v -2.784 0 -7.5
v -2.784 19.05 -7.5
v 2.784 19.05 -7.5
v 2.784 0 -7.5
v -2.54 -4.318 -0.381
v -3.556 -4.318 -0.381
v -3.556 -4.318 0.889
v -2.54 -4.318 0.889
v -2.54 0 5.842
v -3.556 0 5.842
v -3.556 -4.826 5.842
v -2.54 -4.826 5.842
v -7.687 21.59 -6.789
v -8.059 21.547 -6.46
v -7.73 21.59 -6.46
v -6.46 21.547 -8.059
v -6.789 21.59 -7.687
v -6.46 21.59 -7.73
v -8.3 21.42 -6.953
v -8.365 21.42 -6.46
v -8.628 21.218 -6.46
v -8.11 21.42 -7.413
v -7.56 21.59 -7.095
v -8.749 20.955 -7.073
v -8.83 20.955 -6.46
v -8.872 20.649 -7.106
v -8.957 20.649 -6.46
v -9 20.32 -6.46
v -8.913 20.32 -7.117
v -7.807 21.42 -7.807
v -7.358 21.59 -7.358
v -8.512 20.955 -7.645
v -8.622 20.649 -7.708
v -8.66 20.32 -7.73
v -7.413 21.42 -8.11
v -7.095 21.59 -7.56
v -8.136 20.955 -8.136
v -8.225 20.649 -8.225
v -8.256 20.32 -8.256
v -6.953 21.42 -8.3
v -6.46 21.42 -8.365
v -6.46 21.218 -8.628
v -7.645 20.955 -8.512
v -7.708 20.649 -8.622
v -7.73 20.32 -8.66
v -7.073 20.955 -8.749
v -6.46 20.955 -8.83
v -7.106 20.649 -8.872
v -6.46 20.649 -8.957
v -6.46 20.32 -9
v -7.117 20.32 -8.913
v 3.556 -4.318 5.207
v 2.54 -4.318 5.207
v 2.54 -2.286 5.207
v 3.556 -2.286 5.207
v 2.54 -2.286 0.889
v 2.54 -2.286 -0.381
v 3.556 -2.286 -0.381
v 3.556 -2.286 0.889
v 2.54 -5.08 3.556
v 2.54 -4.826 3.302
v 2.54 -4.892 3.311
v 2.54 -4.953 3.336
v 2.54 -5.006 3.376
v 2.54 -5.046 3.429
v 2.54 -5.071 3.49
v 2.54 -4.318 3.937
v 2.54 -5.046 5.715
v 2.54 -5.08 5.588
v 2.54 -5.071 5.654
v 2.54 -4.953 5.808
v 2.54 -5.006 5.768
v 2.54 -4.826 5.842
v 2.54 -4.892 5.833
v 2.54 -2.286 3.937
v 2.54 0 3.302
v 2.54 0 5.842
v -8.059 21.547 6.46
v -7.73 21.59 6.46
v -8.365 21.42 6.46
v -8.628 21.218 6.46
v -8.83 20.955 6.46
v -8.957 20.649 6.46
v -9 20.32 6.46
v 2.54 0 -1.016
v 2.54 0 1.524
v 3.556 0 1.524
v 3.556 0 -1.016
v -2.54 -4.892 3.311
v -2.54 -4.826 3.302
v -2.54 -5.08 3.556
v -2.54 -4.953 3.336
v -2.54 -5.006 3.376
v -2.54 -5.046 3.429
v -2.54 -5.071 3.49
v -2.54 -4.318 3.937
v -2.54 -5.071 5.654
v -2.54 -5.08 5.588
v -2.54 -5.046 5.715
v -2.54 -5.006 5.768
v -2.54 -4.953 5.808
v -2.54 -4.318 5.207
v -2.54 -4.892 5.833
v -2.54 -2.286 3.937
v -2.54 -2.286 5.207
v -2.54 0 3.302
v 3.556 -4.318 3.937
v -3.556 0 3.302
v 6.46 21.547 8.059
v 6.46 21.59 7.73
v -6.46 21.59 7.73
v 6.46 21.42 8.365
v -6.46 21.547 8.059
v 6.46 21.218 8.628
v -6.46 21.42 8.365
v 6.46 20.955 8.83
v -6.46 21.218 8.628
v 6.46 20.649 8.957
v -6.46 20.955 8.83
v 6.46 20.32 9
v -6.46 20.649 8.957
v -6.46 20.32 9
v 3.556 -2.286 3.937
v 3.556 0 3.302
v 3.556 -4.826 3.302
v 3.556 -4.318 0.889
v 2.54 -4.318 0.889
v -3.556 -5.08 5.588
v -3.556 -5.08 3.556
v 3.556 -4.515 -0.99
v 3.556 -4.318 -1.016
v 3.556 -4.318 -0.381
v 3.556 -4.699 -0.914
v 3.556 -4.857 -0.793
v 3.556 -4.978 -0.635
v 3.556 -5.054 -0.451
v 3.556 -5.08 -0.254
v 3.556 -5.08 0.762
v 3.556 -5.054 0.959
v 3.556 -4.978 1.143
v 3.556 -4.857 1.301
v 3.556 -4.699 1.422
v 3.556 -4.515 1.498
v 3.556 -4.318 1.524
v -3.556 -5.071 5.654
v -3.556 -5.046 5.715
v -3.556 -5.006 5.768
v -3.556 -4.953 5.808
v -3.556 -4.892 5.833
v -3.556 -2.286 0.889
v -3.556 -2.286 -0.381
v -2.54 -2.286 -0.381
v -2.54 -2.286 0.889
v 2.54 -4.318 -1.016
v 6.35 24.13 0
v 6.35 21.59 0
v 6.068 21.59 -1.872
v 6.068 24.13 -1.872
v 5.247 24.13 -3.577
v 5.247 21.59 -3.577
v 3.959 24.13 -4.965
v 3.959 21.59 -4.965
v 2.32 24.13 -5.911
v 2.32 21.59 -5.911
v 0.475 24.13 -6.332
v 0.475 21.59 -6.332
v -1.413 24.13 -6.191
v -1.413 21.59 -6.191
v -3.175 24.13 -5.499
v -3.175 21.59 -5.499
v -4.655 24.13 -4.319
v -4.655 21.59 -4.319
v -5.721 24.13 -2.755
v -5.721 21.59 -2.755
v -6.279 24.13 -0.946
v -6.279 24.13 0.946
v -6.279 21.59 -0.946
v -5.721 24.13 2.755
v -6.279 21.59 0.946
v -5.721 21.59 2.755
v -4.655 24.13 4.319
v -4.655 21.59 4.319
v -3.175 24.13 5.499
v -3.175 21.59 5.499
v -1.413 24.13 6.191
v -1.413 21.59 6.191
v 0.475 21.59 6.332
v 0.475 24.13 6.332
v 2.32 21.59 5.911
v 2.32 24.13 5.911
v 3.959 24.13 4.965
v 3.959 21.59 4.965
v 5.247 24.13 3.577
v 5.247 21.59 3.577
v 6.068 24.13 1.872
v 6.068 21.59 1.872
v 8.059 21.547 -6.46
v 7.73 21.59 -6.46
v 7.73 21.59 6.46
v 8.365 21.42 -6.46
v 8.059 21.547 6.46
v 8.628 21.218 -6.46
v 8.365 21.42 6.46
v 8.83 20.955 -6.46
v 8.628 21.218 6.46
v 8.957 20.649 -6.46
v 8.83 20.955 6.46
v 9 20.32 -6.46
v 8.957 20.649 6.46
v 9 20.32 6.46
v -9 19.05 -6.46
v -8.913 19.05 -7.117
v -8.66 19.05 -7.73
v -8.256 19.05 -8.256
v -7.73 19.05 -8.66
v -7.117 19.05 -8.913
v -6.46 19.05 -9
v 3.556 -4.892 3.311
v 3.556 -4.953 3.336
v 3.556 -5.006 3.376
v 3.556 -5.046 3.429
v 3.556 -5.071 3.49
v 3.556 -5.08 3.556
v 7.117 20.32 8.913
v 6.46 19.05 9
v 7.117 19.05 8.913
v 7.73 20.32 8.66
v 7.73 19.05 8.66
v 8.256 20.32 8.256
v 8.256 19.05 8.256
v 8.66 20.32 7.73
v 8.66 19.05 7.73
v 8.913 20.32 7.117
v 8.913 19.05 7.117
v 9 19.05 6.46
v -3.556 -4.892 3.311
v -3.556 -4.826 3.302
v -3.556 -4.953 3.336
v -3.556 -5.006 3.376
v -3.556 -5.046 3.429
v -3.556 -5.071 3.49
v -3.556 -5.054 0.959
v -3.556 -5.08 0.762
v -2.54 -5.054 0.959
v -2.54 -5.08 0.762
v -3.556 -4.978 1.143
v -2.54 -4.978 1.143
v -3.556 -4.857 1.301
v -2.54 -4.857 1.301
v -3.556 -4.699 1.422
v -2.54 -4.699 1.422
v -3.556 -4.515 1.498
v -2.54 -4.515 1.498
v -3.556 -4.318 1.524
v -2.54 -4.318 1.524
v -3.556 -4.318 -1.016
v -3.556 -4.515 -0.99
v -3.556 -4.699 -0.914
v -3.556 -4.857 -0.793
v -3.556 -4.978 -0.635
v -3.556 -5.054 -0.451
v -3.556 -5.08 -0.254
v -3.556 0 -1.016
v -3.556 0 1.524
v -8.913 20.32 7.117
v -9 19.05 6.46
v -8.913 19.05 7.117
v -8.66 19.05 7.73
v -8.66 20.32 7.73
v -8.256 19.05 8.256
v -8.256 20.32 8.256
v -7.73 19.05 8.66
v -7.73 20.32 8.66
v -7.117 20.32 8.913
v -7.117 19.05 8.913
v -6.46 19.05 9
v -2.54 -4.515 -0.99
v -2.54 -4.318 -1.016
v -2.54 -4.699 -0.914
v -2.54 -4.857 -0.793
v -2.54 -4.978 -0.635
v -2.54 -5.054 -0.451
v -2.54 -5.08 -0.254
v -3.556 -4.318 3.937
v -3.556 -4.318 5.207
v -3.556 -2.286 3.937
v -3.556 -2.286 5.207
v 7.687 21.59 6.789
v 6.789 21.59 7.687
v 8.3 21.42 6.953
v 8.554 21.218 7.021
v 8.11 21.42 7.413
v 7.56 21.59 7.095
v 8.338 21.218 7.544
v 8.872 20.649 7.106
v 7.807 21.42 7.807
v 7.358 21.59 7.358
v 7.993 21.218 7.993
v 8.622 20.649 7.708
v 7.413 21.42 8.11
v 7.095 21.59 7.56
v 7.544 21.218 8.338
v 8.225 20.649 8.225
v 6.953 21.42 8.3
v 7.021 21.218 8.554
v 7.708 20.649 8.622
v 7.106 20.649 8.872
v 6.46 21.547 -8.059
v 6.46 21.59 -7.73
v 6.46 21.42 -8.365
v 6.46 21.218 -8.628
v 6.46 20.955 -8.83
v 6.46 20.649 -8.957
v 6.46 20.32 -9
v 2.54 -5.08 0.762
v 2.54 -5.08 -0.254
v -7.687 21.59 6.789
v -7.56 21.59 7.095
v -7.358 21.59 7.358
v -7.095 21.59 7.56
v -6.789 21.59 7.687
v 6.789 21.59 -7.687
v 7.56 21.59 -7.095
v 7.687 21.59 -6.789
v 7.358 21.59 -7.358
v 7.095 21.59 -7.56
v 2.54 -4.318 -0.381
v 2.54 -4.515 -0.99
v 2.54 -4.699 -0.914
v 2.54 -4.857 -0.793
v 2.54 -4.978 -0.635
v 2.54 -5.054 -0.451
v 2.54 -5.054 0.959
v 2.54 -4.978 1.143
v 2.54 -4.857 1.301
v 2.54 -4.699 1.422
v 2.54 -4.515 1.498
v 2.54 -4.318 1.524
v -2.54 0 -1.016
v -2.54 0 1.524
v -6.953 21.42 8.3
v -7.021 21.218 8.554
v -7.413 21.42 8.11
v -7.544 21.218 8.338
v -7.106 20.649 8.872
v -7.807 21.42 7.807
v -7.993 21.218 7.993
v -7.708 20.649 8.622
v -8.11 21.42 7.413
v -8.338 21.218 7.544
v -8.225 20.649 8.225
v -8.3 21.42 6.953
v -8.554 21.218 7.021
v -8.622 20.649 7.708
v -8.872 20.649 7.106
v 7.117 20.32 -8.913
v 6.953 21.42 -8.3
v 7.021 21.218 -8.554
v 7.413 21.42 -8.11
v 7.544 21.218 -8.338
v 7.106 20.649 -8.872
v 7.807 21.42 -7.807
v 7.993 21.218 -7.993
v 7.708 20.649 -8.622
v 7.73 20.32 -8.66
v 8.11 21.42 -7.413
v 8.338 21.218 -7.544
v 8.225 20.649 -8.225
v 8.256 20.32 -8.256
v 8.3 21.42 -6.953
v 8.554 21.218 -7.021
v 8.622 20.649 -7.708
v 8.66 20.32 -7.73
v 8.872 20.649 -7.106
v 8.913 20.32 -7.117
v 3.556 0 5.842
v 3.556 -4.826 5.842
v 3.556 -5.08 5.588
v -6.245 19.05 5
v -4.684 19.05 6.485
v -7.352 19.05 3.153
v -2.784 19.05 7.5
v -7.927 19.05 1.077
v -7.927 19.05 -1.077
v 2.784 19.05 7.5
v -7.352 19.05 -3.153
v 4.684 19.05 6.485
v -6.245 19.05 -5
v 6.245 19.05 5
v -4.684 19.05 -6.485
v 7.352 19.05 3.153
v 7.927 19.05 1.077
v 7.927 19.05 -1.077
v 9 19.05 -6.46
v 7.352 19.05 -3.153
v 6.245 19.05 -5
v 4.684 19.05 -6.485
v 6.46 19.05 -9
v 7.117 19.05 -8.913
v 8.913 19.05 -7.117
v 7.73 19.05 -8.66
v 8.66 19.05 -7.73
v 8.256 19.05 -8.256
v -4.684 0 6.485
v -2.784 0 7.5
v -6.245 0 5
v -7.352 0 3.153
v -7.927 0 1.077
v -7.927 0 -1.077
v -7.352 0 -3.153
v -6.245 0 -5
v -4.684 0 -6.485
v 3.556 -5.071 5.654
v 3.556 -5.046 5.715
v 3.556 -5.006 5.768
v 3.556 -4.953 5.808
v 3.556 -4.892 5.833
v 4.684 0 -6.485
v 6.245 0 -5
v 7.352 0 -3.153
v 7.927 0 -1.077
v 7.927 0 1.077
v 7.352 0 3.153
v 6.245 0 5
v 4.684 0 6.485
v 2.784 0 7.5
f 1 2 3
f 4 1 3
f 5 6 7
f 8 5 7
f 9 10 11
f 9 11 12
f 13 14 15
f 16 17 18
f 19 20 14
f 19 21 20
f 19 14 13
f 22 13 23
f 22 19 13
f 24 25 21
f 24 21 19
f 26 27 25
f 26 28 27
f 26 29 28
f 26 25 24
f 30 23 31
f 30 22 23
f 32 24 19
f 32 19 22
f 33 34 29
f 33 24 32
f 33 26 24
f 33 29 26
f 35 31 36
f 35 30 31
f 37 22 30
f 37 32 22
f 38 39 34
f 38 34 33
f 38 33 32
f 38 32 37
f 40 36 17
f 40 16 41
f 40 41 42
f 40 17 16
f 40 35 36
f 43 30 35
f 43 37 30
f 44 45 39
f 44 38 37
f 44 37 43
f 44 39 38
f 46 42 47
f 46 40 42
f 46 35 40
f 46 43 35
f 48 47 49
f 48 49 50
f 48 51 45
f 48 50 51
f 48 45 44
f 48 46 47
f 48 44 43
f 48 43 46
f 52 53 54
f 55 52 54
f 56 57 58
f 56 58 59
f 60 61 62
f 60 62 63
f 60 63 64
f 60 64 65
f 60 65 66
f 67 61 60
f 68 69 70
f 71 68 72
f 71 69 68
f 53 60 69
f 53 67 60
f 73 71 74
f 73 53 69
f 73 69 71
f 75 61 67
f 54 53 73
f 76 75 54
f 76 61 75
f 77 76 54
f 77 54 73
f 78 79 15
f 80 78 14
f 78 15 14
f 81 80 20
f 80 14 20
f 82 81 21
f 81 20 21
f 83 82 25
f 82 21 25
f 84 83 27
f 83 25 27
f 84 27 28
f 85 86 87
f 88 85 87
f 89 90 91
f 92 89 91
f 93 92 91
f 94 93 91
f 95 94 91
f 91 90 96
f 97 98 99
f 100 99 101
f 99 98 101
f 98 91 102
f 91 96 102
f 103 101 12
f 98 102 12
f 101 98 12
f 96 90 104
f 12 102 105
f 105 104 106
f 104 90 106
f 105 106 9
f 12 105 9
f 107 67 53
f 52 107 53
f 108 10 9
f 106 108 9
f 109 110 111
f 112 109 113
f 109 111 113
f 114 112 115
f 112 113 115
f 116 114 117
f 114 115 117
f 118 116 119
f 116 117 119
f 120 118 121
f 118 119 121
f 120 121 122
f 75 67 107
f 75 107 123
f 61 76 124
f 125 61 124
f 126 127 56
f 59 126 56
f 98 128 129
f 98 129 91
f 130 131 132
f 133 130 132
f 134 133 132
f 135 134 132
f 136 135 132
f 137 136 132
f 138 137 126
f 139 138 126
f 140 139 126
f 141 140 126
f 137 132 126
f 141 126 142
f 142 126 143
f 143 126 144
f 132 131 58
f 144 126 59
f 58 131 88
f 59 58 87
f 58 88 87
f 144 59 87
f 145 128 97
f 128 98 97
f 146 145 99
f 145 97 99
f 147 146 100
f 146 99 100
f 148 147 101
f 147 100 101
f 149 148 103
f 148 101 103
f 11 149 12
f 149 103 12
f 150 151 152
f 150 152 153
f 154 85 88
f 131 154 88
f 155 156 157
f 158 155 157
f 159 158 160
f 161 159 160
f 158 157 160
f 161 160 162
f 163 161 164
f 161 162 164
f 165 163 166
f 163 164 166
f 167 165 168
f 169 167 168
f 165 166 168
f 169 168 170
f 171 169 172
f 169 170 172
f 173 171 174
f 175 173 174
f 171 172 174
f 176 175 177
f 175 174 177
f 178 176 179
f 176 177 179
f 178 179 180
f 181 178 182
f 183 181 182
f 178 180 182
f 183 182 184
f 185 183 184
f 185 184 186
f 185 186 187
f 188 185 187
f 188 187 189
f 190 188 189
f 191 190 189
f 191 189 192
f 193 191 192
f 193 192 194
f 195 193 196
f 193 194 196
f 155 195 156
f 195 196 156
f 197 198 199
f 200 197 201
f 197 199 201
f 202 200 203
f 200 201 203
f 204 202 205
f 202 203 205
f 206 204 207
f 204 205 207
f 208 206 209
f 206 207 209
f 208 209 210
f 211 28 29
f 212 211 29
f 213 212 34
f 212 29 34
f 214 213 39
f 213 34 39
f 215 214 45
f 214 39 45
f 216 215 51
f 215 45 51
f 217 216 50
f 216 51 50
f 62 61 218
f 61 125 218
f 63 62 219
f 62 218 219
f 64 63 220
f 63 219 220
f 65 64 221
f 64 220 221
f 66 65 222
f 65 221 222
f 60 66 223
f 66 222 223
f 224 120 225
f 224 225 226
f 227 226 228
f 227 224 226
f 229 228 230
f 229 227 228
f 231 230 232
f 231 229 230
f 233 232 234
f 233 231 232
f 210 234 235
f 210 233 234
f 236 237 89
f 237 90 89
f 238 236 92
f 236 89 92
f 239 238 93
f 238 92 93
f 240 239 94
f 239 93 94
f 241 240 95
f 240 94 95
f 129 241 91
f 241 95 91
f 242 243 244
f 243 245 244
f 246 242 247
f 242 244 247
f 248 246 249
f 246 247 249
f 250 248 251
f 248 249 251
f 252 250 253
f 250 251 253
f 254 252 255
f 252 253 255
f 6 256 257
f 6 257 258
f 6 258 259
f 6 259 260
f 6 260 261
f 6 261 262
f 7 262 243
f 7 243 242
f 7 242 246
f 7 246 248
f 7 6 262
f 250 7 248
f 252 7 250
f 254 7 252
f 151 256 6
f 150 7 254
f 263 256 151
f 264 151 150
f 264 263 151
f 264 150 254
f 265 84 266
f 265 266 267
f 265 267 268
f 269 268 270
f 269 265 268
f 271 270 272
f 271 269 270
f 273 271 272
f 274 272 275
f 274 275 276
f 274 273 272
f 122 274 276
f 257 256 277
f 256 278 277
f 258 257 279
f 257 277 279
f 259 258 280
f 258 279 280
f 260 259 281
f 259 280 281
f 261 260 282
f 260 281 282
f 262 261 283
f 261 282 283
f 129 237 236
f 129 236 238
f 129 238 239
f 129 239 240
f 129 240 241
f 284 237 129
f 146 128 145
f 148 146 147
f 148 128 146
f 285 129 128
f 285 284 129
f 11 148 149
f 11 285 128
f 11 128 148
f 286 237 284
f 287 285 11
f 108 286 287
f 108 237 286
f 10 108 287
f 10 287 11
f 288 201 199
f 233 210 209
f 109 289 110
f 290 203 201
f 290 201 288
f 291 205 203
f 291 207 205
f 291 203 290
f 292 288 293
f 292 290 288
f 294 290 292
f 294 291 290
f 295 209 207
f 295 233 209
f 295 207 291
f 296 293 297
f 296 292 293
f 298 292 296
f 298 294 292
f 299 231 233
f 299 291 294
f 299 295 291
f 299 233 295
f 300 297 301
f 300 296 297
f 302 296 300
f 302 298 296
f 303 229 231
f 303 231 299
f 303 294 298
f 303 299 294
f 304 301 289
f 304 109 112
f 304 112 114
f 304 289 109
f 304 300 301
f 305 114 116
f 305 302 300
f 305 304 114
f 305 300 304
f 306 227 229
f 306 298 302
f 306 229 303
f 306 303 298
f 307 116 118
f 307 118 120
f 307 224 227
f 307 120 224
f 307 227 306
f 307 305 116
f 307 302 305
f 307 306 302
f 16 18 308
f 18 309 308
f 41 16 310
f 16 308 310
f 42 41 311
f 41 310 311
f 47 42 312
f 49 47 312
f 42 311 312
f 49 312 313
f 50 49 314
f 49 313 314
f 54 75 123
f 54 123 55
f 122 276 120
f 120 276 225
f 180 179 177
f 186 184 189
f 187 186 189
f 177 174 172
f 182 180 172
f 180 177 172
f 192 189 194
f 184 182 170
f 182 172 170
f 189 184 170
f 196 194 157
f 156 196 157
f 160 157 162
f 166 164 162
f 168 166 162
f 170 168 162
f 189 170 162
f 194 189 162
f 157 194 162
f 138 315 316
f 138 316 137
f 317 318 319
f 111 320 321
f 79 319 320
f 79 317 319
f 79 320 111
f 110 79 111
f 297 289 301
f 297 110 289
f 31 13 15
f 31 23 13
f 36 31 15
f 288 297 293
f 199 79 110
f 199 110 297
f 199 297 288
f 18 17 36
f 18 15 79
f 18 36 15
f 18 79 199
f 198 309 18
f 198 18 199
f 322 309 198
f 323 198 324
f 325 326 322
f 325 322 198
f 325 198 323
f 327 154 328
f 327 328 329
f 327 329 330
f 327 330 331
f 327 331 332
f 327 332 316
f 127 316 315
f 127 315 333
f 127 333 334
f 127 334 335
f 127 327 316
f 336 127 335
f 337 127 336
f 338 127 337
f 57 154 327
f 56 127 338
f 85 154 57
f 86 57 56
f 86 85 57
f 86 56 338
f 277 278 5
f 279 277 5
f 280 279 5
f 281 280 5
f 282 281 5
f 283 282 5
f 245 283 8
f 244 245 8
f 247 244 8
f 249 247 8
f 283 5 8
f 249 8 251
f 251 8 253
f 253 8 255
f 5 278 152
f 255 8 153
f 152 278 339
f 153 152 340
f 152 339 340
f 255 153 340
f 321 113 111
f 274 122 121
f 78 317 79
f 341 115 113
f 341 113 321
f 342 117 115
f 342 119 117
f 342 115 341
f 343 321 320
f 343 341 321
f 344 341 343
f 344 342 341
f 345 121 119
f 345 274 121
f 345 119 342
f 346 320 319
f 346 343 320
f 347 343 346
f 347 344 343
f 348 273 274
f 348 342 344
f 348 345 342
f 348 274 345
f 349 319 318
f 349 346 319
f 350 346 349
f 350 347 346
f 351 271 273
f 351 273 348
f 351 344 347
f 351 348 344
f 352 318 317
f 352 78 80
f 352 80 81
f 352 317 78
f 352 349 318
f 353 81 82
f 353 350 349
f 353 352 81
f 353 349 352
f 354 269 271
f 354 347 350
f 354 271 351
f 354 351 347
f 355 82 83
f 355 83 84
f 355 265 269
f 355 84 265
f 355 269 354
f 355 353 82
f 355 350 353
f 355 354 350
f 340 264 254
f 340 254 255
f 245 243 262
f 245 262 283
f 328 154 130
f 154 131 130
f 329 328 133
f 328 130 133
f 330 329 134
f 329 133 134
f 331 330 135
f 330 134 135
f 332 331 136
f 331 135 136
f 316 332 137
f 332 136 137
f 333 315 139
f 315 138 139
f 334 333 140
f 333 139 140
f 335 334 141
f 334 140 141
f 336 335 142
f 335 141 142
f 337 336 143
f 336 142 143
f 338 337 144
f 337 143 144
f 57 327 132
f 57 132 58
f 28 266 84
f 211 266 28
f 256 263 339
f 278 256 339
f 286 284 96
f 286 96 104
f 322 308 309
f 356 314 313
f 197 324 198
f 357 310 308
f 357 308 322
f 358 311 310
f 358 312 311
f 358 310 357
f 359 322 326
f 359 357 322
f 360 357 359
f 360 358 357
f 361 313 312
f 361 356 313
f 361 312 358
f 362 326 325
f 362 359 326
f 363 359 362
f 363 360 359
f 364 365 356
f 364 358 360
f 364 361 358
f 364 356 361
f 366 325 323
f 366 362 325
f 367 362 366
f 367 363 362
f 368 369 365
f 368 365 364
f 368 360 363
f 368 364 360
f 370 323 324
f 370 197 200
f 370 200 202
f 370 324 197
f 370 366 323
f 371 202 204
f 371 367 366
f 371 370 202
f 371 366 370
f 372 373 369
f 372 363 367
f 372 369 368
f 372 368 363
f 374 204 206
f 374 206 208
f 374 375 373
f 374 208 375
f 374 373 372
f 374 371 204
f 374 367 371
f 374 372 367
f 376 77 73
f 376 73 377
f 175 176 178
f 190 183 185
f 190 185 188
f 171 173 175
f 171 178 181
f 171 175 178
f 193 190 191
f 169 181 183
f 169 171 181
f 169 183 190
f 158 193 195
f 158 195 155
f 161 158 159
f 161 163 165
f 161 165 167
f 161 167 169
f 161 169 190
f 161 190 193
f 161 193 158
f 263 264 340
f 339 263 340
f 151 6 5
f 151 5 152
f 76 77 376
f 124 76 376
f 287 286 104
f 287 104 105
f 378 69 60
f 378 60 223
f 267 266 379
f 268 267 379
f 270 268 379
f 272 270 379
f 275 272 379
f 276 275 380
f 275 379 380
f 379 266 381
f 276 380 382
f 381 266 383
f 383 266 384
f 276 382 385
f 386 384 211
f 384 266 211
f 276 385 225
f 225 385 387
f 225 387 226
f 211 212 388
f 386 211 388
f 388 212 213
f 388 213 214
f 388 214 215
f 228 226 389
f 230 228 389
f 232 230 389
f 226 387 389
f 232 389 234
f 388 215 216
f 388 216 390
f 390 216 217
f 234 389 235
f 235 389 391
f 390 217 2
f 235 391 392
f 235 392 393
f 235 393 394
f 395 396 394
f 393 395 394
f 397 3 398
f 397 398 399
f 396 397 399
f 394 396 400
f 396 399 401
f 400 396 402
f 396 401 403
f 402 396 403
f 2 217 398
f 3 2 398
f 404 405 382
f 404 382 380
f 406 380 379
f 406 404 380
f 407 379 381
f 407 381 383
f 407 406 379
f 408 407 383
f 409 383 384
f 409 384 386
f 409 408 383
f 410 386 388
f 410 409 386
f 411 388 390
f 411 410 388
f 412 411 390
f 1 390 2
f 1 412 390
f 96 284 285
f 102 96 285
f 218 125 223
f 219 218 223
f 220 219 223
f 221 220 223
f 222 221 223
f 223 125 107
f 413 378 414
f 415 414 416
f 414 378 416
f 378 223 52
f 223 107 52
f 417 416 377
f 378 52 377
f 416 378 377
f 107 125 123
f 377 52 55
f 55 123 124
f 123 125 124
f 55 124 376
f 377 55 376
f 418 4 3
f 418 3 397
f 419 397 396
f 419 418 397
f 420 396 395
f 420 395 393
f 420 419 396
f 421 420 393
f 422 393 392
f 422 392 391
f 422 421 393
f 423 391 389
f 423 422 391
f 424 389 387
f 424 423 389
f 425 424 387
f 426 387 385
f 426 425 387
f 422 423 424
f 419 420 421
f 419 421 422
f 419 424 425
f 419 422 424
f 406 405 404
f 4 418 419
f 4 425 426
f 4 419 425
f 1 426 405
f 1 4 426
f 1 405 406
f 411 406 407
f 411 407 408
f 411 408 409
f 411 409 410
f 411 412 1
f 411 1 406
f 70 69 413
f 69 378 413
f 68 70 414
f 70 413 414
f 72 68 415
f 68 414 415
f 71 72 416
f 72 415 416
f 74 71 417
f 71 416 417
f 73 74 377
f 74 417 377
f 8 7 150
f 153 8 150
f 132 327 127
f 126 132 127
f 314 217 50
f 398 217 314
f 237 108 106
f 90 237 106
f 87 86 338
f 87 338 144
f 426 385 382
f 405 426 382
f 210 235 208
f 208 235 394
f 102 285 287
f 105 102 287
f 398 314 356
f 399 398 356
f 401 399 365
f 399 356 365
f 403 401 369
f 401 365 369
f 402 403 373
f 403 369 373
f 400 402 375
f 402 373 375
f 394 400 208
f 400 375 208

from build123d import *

# Parameters (mm, degrees)
BOSS_EXTRUDE1_DEPTH   = 19.05
SKETCH2_W             = 18
SKETCH2_H             = 18
BOSS_EXTRUDE2_DEPTH   = 2.54
FILLET1_R             = 2.54
FILLET2_R             = 1.27
SKETCH3_R             = 6.35
BOSS_EXTRUDE3_DEPTH   = 2.54
SKETCH4_W             = 1.016
SKETCH4_H             = 2.54
BOSS_EXTRUDE5_DEPTH   = 5.08
BOSS_EXTRUDE5_2_DEPTH = 5.08
BOSS_EXTRUDE5_3_DEPTH = 5.08
BOSS_EXTRUDE5_4_DEPTH = 5.08
SKETCH5_W             = 1.27
SKETCH5_H             = 2.032
CUT_EXTRUDE1_DEPTH    = 8.128
FILLET3_R             = 0.254
FILLET4_R             = 0.254
FILLET5_R             = 0.762
FILLET6_R             = 0.762


with BuildPart() as part:
    # Sketch1 → Boss-Extrude1 (new body)
    with BuildSketch(Plane(origin=(0, 0, 0), x_dir=(1, 0, 0), z_dir=(0, 1, 0))):
        with BuildLine():
            Line((-2.783882181, 7.5), (2.783882181, 7.5))
            ThreePointArc((2.783882181, 7.5), (8, 0), (2.783882181, -7.5))
            Line((2.783882181, -7.5), (-2.783882181, -7.5))
            ThreePointArc((-2.783882181, -7.5), (-8, 0), (-2.783882181, 7.5))
        make_face()
    extrude(amount=BOSS_EXTRUDE1_DEPTH)

    # Sketch2 → Boss-Extrude2 (add)
    with BuildSketch(Plane(origin=(0, 19.05, 0), x_dir=(1, 0, 0), z_dir=(0, 1, 0))):
        Rectangle(SKETCH2_W, SKETCH2_H)
    extrude(amount=BOSS_EXTRUDE2_DEPTH)

    # Fillet1
    fillet1_edges = [part.edges().sort_by_distance(p)[0] for p in [
        (-9, 20.32, -9),
        (-9, 20.32, 9),
        (9, 20.32, 9),
        (9, 20.32, -9),
    ]]
    fillet(fillet1_edges, radius=FILLET1_R)

    # Fillet2
    fillet2_edges = [part.edges().sort_by_distance(p)[0] for p in [
        (0, 21.59, -9),
        (9, 21.59, 0),
        (-9, 21.59, 0),
        (0, 21.59, 9),
        (8.256051224, 21.59, 8.256051224),
        (-8.256051224, 21.59, 8.256051224),
        (-8.256051224, 21.59, -8.256051224),
        (8.256051224, 21.59, -8.256051224),
    ]]
    fillet(fillet2_edges, radius=FILLET2_R)


with BuildPart() as body_2:
    # Sketch3 → Boss-Extrude3 (new body)
    with BuildSketch(Plane(origin=(0, 21.59, 0), x_dir=(1, 0, 0), z_dir=(0, 1, 0))):
        Circle(SKETCH3_R)
    extrude(amount=BOSS_EXTRUDE3_DEPTH)


with BuildPart() as body_3:
    # Sketch4 → Boss-Extrude5 (new body)
    with BuildSketch(Plane.XZ):
        with Locations((3.048, 0.254)):
            Rectangle(SKETCH4_W, SKETCH4_H)
    extrude(amount=BOSS_EXTRUDE5_DEPTH)


with BuildPart() as body_4:
    # Sketch4 → Boss-Extrude5 2 (new body)
    with BuildSketch(Plane.XZ):
        with Locations((-3.048, 4.572)):
            Rectangle(SKETCH4_W, SKETCH4_H)
    extrude(amount=BOSS_EXTRUDE5_2_DEPTH)


with BuildPart() as body_5:
    # Sketch4 → Boss-Extrude5 3 (new body)
    with BuildSketch(Plane.XZ):
        with Locations((-3.048, 0.254)):
            Rectangle(SKETCH4_W, SKETCH4_H)
    extrude(amount=BOSS_EXTRUDE5_3_DEPTH)


with BuildPart() as body_6:
    # Sketch4 → Boss-Extrude5 4 (new body)
    with BuildSketch(Plane.XZ):
        with Locations((3.048, 4.572)):
            Rectangle(SKETCH4_W, SKETCH4_H)
    extrude(amount=BOSS_EXTRUDE5_4_DEPTH)


with BuildPart() as cut_extrude1_tool:
    # Sketch5 → Cut-Extrude1 (new body)
    with BuildSketch(Plane.ZY.offset(3.556)):
        with Locations((4.572, -3.302)):
            Rectangle(SKETCH5_W, SKETCH5_H)
        with Locations((0.254, -3.302)):
            Rectangle(SKETCH5_W, SKETCH5_H)
    extrude(amount=-CUT_EXTRUDE1_DEPTH)


with BuildPart() as body_3_1:
    add(body_3.part)

    # Cut-Extrude1: cut by cut_extrude1_tool
    add(cut_extrude1_tool.part, mode=Mode.SUBTRACT)

    # Fillet6
    fillet6_edges = [body_3_1.edges().sort_by_distance(p)[0] for p in [
        (3.048, -5.08, -1.016),
        (3.048, -5.08, 1.524),
    ]]
    fillet(fillet6_edges, radius=FILLET6_R)


with BuildPart() as body_4_1:
    add(body_4.part)

    # Cut-Extrude1: cut by cut_extrude1_tool
    add(cut_extrude1_tool.part, mode=Mode.SUBTRACT)

    # Fillet3
    fillet3_edges = [body_4_1.edges().sort_by_distance(p)[0] for p in [
        (-3.048, -5.08, 5.842),
        (-3.048, -5.08, 3.302),
    ]]
    fillet(fillet3_edges, radius=FILLET3_R)


with BuildPart() as body_5_1:
    add(body_5.part)

    # Cut-Extrude1: cut by cut_extrude1_tool
    add(cut_extrude1_tool.part, mode=Mode.SUBTRACT)

    # Fillet5
    fillet5_edges = [body_5_1.edges().sort_by_distance(p)[0] for p in [
        (-3.048, -5.08, 1.524),
        (-3.048, -5.08, -1.016),
    ]]
    fillet(fillet5_edges, radius=FILLET5_R)


with BuildPart() as body_6_1:
    add(body_6.part)

    # Cut-Extrude1: cut by cut_extrude1_tool
    add(cut_extrude1_tool.part, mode=Mode.SUBTRACT)

    # Fillet4
    fillet4_edges = [body_6_1.edges().sort_by_distance(p)[0] for p in [
        (3.048, -5.08, 3.302),
        (3.048, -5.08, 5.842),
    ]]
    fillet(fillet4_edges, radius=FILLET4_R)


solid = Compound([part.part, body_2.part, body_3_1.part, body_4_1.part, body_5_1.part, body_6_1.part])
